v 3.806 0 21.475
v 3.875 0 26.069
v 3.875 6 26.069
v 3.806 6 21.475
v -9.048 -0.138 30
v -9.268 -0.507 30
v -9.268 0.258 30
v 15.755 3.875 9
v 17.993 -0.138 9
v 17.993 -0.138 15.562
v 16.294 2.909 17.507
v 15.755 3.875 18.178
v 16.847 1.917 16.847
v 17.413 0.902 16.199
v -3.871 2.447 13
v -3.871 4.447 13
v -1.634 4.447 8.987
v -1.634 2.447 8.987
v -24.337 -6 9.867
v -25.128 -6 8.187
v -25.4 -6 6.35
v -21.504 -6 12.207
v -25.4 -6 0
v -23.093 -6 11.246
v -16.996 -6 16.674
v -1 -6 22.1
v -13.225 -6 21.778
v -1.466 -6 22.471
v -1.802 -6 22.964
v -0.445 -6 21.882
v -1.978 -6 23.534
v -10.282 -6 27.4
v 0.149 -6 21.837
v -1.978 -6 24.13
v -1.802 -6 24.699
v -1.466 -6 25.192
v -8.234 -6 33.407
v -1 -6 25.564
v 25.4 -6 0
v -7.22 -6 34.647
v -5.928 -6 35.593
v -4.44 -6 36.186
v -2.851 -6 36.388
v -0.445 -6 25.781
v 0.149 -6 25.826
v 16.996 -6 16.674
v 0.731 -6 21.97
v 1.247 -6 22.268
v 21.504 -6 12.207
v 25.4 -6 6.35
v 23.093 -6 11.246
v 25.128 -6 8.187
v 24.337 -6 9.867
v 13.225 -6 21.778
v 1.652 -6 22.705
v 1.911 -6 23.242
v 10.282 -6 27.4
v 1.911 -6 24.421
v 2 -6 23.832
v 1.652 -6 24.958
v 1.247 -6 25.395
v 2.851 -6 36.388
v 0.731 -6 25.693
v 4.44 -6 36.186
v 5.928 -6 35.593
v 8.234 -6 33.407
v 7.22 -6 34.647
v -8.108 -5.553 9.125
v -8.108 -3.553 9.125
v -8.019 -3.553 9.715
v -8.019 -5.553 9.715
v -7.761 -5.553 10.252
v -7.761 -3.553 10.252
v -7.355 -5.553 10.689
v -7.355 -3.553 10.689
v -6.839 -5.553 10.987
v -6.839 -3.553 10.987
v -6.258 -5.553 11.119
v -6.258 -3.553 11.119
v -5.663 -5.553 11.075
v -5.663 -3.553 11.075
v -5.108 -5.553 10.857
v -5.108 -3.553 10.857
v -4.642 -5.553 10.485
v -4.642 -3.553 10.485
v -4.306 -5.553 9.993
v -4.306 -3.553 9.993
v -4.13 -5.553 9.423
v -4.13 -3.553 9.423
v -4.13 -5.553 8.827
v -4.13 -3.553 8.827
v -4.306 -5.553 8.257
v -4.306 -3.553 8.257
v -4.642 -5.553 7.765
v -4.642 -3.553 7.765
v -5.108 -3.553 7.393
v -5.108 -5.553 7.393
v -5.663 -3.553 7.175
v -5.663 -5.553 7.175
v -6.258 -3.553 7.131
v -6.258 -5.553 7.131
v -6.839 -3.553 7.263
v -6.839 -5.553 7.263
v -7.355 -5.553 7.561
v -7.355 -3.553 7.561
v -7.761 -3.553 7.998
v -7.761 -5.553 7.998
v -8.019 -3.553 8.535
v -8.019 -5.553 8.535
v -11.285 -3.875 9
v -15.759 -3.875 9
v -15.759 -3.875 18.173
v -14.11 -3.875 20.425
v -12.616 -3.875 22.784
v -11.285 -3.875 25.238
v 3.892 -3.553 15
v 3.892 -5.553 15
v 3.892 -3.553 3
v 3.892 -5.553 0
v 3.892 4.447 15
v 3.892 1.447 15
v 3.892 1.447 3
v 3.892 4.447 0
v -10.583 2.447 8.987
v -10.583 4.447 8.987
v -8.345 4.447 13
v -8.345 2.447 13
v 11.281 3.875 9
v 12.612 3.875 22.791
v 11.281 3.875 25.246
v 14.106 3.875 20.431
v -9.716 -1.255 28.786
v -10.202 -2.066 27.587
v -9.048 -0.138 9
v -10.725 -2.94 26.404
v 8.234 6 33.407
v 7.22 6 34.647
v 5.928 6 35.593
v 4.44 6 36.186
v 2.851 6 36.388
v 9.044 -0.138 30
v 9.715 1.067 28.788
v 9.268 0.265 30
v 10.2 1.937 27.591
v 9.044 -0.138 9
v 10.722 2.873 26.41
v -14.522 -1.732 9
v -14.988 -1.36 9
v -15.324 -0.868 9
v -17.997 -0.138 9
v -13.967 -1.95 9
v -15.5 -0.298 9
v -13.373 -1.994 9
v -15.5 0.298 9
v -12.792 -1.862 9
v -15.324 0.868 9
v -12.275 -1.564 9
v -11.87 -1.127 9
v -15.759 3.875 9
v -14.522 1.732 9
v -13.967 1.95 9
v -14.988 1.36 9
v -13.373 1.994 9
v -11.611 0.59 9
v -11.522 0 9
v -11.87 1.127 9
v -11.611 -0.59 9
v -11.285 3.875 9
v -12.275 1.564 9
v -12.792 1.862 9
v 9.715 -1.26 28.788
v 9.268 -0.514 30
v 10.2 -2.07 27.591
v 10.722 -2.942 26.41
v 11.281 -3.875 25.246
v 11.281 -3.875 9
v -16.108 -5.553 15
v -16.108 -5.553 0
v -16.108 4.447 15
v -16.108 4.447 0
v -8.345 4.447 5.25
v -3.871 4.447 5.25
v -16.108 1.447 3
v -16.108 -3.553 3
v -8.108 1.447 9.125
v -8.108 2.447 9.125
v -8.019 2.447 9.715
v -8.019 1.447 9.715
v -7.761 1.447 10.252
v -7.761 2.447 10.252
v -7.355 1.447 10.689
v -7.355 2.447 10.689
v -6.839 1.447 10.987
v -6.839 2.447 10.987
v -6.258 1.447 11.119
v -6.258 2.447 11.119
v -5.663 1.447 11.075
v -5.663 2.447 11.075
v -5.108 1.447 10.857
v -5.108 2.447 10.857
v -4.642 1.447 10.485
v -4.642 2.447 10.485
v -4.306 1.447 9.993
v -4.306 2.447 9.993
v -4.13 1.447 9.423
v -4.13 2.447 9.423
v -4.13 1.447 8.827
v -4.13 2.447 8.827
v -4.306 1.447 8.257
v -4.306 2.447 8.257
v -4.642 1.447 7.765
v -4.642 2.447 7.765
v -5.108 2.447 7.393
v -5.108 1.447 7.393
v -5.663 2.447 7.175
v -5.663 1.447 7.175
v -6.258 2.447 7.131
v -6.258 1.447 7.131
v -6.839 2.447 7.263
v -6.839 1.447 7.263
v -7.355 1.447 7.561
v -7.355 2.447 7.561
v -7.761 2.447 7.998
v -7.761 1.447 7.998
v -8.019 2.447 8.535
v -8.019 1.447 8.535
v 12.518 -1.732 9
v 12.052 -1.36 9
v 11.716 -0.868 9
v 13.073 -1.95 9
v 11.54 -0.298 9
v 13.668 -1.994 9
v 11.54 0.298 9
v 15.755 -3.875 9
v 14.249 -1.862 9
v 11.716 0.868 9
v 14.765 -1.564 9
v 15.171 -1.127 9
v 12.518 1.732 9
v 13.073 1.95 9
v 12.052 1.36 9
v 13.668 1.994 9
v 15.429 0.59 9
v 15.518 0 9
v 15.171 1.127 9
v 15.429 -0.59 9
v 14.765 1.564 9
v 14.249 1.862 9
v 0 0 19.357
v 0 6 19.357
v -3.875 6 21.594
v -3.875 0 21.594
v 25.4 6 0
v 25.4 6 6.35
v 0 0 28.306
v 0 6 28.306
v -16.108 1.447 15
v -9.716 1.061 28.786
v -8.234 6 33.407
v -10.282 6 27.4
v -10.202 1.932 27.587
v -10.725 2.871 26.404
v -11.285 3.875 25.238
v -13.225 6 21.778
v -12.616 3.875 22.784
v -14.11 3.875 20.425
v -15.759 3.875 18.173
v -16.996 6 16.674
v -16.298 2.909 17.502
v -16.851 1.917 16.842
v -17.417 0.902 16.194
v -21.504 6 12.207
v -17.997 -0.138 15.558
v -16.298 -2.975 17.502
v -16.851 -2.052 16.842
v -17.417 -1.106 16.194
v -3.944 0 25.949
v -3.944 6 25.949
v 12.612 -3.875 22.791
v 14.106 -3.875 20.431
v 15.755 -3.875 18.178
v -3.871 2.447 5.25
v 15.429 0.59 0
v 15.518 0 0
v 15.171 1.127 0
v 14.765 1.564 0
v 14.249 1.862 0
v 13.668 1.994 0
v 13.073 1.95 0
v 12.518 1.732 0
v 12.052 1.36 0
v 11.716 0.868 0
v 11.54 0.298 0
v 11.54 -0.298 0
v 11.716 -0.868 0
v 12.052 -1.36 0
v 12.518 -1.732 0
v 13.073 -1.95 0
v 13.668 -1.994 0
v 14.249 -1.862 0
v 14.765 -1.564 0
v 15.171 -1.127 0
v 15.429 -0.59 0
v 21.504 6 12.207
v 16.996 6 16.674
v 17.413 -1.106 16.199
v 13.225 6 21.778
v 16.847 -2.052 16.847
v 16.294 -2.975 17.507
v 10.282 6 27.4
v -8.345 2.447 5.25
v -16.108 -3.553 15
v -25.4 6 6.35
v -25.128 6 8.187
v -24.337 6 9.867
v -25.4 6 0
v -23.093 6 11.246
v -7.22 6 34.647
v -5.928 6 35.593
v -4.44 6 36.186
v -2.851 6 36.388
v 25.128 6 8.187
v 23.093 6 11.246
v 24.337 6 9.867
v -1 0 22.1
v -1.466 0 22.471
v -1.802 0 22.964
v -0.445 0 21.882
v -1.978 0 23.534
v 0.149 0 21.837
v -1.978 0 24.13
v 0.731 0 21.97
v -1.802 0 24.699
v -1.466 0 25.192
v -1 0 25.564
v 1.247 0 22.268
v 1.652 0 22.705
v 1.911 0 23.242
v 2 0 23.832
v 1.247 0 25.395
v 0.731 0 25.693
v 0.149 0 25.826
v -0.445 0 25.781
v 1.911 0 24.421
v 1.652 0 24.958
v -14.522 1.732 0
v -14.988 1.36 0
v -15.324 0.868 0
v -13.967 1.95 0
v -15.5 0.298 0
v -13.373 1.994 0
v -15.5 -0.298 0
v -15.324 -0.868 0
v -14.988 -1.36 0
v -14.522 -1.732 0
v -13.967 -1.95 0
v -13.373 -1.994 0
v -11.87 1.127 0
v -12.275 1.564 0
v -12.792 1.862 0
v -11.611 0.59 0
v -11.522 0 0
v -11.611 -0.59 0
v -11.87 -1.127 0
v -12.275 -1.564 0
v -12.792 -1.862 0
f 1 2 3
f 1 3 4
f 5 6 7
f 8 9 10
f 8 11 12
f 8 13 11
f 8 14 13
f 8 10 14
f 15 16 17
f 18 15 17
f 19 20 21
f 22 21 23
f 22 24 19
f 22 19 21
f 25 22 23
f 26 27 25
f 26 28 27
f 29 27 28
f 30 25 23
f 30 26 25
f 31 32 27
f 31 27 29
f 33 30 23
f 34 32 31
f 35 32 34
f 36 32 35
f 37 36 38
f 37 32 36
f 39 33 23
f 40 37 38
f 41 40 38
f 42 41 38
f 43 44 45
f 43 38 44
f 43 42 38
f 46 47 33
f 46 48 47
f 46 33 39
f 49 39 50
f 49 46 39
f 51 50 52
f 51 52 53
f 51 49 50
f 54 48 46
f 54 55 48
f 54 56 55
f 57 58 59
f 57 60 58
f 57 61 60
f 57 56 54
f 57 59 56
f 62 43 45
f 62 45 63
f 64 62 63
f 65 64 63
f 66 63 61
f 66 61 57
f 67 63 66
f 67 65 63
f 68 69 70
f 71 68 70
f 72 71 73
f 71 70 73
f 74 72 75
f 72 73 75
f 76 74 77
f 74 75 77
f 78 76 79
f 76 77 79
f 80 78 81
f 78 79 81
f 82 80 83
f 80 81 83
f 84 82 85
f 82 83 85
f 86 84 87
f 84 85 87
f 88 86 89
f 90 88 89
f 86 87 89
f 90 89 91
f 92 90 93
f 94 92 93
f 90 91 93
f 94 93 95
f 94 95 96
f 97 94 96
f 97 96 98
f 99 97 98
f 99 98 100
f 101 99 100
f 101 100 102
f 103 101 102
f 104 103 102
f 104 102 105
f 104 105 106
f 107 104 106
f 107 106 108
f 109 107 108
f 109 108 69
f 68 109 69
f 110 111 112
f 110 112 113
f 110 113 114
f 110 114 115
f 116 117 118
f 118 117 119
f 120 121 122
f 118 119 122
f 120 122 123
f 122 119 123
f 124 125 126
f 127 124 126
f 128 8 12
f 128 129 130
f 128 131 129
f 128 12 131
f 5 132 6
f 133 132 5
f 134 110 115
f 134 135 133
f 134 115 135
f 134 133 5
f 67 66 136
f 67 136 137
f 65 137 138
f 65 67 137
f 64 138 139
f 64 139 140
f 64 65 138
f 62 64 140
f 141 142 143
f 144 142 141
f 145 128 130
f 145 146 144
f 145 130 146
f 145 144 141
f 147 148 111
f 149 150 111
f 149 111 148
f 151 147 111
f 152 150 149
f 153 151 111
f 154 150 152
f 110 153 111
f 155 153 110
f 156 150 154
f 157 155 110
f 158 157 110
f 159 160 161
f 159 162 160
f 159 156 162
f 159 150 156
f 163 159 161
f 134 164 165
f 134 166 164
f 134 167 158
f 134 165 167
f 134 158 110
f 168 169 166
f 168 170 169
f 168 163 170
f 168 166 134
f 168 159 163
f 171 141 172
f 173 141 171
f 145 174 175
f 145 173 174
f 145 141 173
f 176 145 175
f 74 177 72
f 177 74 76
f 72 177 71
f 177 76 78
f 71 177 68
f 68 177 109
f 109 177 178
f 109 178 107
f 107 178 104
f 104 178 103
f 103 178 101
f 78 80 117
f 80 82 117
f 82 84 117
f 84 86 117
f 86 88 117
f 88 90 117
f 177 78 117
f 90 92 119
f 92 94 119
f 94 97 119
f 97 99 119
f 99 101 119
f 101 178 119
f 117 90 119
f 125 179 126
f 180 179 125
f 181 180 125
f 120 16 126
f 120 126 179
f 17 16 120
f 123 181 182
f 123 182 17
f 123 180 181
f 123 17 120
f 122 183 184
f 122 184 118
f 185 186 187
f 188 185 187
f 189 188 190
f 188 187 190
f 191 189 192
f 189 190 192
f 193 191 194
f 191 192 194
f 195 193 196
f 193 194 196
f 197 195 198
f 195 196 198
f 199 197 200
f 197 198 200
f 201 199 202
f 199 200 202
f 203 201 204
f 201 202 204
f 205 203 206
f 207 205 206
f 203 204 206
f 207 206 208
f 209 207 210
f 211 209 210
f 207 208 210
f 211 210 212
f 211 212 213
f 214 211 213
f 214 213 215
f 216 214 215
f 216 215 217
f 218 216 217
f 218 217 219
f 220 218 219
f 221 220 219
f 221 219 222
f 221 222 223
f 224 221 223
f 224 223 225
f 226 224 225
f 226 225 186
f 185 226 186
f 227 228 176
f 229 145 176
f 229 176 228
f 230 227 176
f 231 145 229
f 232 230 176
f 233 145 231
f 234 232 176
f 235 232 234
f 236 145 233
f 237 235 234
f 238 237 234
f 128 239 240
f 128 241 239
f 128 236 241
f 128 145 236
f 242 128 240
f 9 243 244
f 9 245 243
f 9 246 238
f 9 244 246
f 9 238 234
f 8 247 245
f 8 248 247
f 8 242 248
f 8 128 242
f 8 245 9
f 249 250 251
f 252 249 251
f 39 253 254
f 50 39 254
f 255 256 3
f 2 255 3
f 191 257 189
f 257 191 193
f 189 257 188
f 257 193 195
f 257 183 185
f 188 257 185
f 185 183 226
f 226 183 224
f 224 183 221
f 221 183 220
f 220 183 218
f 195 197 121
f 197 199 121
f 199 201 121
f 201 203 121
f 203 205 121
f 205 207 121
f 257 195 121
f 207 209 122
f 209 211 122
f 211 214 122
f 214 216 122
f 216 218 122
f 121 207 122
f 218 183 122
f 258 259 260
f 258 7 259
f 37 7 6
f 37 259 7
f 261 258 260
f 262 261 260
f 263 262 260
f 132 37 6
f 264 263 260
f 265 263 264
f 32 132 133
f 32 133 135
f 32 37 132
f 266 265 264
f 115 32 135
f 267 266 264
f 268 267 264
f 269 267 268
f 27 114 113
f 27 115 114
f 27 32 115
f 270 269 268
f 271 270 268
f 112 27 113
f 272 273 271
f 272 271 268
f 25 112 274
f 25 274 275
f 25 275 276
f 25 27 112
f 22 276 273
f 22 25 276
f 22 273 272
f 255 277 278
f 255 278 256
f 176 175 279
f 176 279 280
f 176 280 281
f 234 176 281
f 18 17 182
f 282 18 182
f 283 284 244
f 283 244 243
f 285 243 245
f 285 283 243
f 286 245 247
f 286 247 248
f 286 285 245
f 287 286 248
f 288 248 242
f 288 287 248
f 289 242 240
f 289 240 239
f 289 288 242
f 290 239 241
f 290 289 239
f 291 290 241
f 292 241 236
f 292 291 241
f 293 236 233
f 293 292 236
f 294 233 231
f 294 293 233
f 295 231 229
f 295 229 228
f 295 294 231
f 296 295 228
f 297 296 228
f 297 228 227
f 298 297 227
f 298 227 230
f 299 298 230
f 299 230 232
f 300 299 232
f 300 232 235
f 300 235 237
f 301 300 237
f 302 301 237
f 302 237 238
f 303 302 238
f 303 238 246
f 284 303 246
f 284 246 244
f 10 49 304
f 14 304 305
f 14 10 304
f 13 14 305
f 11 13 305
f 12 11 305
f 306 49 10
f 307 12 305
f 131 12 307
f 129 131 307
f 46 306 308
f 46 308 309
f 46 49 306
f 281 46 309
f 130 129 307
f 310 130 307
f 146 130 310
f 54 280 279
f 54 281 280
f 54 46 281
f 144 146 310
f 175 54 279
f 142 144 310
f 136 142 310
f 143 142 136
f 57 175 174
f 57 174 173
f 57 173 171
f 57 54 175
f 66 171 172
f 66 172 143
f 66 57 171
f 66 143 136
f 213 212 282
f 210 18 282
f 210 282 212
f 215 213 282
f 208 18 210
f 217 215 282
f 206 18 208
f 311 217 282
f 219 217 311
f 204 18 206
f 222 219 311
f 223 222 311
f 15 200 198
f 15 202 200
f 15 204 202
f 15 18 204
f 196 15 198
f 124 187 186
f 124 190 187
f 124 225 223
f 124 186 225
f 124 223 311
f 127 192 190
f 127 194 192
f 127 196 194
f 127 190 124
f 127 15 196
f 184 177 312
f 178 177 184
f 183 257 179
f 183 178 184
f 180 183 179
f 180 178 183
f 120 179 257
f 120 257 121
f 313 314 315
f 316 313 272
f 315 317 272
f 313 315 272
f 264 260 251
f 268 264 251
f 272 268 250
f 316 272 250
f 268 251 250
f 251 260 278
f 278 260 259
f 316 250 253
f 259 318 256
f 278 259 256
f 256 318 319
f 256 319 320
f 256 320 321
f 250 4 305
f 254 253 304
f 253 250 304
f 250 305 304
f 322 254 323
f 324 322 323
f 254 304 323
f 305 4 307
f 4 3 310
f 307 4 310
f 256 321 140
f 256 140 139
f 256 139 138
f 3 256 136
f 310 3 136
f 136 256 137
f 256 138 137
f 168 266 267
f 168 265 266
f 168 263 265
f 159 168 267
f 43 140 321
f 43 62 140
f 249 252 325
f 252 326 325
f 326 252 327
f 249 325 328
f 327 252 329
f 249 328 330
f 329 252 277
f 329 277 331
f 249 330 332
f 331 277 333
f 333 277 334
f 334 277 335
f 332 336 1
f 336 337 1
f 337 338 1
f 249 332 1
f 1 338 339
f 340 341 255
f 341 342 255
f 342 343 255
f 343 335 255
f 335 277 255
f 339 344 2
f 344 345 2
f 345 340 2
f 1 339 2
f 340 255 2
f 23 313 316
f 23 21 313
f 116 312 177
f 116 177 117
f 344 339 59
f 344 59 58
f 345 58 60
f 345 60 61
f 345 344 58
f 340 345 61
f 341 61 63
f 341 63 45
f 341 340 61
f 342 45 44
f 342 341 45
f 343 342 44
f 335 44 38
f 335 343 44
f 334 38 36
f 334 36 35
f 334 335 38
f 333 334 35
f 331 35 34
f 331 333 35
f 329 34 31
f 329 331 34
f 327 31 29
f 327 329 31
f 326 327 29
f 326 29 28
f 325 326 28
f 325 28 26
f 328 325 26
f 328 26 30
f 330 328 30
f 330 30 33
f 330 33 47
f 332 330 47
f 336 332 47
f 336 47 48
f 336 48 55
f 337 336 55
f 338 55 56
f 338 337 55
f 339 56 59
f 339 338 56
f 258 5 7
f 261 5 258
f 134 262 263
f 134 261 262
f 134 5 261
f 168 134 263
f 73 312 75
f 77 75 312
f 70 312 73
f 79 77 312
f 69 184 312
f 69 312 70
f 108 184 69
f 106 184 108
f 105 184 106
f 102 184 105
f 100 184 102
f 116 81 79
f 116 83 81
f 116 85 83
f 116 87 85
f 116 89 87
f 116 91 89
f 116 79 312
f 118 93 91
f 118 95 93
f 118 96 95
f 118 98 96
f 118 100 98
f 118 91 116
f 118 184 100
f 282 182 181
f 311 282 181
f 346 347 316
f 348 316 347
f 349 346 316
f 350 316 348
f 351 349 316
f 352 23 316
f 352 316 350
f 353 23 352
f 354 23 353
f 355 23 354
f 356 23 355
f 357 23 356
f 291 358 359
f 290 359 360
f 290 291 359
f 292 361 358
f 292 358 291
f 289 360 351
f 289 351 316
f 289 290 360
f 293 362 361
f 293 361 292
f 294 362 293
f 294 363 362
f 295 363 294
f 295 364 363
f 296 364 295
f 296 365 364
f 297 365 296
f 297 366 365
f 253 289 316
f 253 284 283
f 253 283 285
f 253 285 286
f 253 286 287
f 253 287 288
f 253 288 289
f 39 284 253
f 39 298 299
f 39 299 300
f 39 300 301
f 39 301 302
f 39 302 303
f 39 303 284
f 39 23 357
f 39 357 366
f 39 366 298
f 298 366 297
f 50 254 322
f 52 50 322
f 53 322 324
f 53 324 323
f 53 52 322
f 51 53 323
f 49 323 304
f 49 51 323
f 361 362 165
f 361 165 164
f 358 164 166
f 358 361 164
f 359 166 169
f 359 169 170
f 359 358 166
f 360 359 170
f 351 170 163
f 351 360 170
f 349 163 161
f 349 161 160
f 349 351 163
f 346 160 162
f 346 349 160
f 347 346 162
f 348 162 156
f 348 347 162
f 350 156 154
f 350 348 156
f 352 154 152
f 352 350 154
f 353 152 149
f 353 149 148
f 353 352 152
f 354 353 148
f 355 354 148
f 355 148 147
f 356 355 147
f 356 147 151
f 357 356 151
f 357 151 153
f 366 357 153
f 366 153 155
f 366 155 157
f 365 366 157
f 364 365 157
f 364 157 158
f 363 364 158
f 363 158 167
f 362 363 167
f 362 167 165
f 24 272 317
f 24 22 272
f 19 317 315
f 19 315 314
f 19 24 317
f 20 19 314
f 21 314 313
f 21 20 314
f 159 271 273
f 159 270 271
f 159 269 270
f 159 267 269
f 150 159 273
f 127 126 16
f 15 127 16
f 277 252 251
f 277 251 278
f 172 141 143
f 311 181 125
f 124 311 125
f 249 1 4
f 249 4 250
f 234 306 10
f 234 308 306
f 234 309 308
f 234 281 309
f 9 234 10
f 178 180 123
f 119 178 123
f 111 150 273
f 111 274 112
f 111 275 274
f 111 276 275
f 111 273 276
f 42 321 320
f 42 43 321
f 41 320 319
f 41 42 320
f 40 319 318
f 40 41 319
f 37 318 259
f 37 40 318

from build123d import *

# Parameters (mm, degrees)
F0_W      = 20
F0_H      = 5
F1_DEPTH  = 3
F0_H_2    = 3
F0_H_3    = 2
F2_DEPTH  = 15
F3_R      = 2
F4_DEPTH  = 2
F5_DEPTH  = 25.4
F6_R      = 2
F7_DEPTH  = 6
F8_DEPTH  = 6
F9_R      = 2
F10_DEPTH = 25.4
F11_START = 9
F11_DEPTH = 21


with BuildPart() as f1:
    # F0 (on Top) → F1 (new body)
    with BuildSketch(Plane.XY):
        with Locations((-6.108090542, -1.053064514)):
            Rectangle(F0_W, F0_H)
    extrude(amount=F1_DEPTH)

    # F0 (on Top) → F2 (join)
    with BuildSketch(Plane.XY):
        with Locations((-6.108090542, 2.946935486)):
            Rectangle(F0_W, F0_H_2)
        with Locations((-6.108090542, -4.553064514)):
            Rectangle(F0_W, F0_H_3)
    extrude(amount=F2_DEPTH)

    # F3 (on face) → F4 (cut)
    with BuildSketch(Plane(origin=(0, 4.446935486, 0), x_dir=(-1, 0, 0), z_dir=(0, 1, 0))):
        Polygon((10.5825551282, 8.9868011065), (8.3453228351, 13), (3.8708582489, 13), (1.6336259557, 8.9868011065), (3.8708582489, 5.25), (8.3453228351, 5.25), align=None)
        with Locations((6.108090542, 9.125)):
            Circle(F3_R, mode=Mode.SUBTRACT)
    extrude(amount=-F4_DEPTH, mode=Mode.SUBTRACT)

    # F5 (cut): a face of the model
    f5_faces = [f1.faces().sort_by_distance(p)[0] for p in [
        (-6.108090542, 4.446935486, 9.125),
    ]]
    extrude(f5_faces, amount=-F5_DEPTH, mode=Mode.SUBTRACT)


with BuildPart() as f7:
    # F6 (on Front) → F7 (new body)
    with BuildSketch(Plane.XZ):
        with BuildLine():
            Line((-25.4, 6.35), (-25.4, 0))
            Line((-25.4, 0), (25.4, 0))
            Line((25.4, 0), (25.4, 6.3500013265))
            ThreePointArc((25.4, 6.3500013265), (24.3368879233, 9.8672894988), (21.5035224923, 12.2068543535))
            ThreePointArc((21.5035224923, 12.2068543535), (13.2254338027, 21.7784198761), (8.233914751, 33.4071066662))
            ThreePointArc((8.233914751, 33.4071066662), (5.9277949415, 35.5930574418), (2.8513464312, 36.3880630597))
            Line((2.8513464312, 36.3880630597), (-2.8513454918, 36.3880633483))
            ThreePointArc((-2.8513454918, 36.3880633483), (-5.9277945127, 35.5930578036), (-8.233914635, 33.4071066662))
            ThreePointArc((-8.233914635, 33.4071066662), (-13.2254333146, 21.7784197643), (-21.5035211719, 12.2068535801))
            ThreePointArc((-21.5035211719, 12.2068535801), (-24.3368875268, 9.8672887683), (-25.4, 6.35))
        make_face()
        Polygon((0, 28.3061052624), (3.875, 26.0688729693), (3.8059005532, 21.4747246305), (0, 19.3571760899), (-3.875, 21.594408383), (-3.9440994468, 25.9491892167), align=None, mode=Mode.SUBTRACT)
        Polygon((3.8059005532, 21.4747246305), (3.875, 26.0688729693), (0, 28.3061052624), (-3.9440994468, 25.9491892167), (-3.875, 21.594408383), (0, 19.3571760899), align=None)
        with Locations((0, 23.8316406762)):
            Circle(F6_R, mode=Mode.SUBTRACT)
    extrude(amount=F7_DEPTH)

    # F6 (on Front) → F8 (join)
    with BuildSketch(Plane.XZ):
        with BuildLine():
            Line((-25.4, 6.35), (-25.4, 0))
            Line((-25.4, 0), (25.4, 0))
            Line((25.4, 0), (25.4, 6.3500013265))
            ThreePointArc((25.4, 6.3500013265), (24.3368879233, 9.8672894988), (21.5035224923, 12.2068543535))
            ThreePointArc((21.5035224923, 12.2068543535), (13.2254338027, 21.7784198761), (8.233914751, 33.4071066662))
            ThreePointArc((8.233914751, 33.4071066662), (5.9277949415, 35.5930574418), (2.8513464312, 36.3880630597))
            Line((2.8513464312, 36.3880630597), (-2.8513454918, 36.3880633483))
            ThreePointArc((-2.8513454918, 36.3880633483), (-5.9277945127, 35.5930578036), (-8.233914635, 33.4071066662))
            ThreePointArc((-8.233914635, 33.4071066662), (-13.2254333146, 21.7784197643), (-21.5035211719, 12.2068535801))
            ThreePointArc((-21.5035211719, 12.2068535801), (-24.3368875268, 9.8672887683), (-25.4, 6.35))
        make_face()
        Polygon((0, 28.3061052624), (3.875, 26.0688729693), (3.8059005532, 21.4747246305), (0, 19.3571760899), (-3.875, 21.594408383), (-3.9440994468, 25.9491892167), align=None, mode=Mode.SUBTRACT)
    extrude(amount=-F8_DEPTH)

    # F9 (on Top) → F10 (cut)
    with BuildSketch(Plane.XY):
        with Locations((-13.5221913382, 0)):
            Circle(F9_R)
        with Locations((13.5180821443, 0)):
            Circle(F9_R)
    extrude(amount=F10_DEPTH, mode=Mode.SUBTRACT)

    # F9 (on Top) → F11 (cut)
    with BuildSketch(Plane.XY.offset(F11_START)):
        Polygon((-9.047726752, -0.1381988935), (-11.2849590451, 3.875), (-15.7594236313, 3.875), (-17.9966559245, -0.1381988935), (-15.7594236313, -3.875), (-11.2849590451, -3.875), align=None)
        with Locations((-13.5221913382, 0)):
            Circle(F9_R, mode=Mode.SUBTRACT)
        Polygon((17.9925467305, -0.1381988935), (15.7553144374, 3.875), (11.2808498512, 3.875), (9.0436175581, -0.1381988935), (11.2808498512, -3.875), (15.7553144374, -3.875), align=None)
        with Locations((13.5180821443, 0)):
            Circle(F9_R, mode=Mode.SUBTRACT)
    extrude(amount=F11_DEPTH, mode=Mode.SUBTRACT)


solid = Compound([f1.part, f7.part])
